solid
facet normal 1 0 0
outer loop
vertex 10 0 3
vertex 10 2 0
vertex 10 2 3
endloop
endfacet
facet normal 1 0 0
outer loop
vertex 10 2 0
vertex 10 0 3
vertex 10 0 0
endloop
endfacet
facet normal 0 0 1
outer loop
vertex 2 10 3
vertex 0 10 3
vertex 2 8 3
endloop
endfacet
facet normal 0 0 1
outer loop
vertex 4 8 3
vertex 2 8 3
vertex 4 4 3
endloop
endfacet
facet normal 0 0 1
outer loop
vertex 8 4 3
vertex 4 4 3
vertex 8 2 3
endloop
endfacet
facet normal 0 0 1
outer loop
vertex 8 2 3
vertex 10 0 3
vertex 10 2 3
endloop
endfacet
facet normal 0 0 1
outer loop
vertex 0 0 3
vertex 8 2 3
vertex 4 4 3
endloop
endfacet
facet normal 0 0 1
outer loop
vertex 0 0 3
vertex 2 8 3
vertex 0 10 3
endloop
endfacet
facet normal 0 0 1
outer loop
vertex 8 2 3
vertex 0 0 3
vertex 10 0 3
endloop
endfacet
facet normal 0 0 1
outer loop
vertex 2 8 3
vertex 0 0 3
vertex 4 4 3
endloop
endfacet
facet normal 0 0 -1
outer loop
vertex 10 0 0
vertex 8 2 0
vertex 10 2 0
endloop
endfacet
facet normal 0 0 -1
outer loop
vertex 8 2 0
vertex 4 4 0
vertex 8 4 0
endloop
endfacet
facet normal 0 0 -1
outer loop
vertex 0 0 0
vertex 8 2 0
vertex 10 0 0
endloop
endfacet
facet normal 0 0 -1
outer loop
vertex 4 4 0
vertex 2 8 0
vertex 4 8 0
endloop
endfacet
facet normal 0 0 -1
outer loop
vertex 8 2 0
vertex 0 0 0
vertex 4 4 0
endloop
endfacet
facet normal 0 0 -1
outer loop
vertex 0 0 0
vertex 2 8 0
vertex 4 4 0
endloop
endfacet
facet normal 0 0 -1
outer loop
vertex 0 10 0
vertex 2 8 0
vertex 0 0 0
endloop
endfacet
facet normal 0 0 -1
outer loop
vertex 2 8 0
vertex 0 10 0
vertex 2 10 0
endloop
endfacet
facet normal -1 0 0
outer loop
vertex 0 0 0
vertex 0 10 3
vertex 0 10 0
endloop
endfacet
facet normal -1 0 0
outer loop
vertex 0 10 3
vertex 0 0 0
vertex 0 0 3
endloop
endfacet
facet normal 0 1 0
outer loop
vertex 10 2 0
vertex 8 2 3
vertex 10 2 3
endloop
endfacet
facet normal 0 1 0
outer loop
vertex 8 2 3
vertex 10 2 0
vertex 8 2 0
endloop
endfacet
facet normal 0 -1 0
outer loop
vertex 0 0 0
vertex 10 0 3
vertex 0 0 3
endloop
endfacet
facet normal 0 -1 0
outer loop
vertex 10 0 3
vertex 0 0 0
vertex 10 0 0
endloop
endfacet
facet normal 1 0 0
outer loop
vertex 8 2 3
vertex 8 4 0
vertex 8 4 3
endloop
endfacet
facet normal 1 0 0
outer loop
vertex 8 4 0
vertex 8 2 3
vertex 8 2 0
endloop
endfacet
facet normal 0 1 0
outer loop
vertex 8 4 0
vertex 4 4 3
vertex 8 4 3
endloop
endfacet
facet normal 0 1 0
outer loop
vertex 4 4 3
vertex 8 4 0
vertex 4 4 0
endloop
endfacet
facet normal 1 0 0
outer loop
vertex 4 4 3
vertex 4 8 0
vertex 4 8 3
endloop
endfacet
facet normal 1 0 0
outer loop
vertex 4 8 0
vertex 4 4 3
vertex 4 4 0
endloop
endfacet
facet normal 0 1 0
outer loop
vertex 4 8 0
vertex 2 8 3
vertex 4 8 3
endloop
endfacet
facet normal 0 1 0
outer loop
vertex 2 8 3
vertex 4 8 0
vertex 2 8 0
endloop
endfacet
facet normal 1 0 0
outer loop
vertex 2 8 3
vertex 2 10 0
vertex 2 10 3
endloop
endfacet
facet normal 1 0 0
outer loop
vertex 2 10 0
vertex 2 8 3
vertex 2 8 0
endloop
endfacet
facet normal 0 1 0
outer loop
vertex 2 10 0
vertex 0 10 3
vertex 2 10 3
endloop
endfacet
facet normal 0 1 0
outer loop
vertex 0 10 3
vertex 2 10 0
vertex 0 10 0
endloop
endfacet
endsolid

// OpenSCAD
//Question 2
color("#0D98BA"){
    cube([10, 2, 3]);
    translate([0, 2, 0])
        cube([8, 2, 3]);
    translate([0, 4, 0])
        cube([4, 4, 3]);
    translate([0, 8, 0])
        cube([2, 2, 3]);
    }
